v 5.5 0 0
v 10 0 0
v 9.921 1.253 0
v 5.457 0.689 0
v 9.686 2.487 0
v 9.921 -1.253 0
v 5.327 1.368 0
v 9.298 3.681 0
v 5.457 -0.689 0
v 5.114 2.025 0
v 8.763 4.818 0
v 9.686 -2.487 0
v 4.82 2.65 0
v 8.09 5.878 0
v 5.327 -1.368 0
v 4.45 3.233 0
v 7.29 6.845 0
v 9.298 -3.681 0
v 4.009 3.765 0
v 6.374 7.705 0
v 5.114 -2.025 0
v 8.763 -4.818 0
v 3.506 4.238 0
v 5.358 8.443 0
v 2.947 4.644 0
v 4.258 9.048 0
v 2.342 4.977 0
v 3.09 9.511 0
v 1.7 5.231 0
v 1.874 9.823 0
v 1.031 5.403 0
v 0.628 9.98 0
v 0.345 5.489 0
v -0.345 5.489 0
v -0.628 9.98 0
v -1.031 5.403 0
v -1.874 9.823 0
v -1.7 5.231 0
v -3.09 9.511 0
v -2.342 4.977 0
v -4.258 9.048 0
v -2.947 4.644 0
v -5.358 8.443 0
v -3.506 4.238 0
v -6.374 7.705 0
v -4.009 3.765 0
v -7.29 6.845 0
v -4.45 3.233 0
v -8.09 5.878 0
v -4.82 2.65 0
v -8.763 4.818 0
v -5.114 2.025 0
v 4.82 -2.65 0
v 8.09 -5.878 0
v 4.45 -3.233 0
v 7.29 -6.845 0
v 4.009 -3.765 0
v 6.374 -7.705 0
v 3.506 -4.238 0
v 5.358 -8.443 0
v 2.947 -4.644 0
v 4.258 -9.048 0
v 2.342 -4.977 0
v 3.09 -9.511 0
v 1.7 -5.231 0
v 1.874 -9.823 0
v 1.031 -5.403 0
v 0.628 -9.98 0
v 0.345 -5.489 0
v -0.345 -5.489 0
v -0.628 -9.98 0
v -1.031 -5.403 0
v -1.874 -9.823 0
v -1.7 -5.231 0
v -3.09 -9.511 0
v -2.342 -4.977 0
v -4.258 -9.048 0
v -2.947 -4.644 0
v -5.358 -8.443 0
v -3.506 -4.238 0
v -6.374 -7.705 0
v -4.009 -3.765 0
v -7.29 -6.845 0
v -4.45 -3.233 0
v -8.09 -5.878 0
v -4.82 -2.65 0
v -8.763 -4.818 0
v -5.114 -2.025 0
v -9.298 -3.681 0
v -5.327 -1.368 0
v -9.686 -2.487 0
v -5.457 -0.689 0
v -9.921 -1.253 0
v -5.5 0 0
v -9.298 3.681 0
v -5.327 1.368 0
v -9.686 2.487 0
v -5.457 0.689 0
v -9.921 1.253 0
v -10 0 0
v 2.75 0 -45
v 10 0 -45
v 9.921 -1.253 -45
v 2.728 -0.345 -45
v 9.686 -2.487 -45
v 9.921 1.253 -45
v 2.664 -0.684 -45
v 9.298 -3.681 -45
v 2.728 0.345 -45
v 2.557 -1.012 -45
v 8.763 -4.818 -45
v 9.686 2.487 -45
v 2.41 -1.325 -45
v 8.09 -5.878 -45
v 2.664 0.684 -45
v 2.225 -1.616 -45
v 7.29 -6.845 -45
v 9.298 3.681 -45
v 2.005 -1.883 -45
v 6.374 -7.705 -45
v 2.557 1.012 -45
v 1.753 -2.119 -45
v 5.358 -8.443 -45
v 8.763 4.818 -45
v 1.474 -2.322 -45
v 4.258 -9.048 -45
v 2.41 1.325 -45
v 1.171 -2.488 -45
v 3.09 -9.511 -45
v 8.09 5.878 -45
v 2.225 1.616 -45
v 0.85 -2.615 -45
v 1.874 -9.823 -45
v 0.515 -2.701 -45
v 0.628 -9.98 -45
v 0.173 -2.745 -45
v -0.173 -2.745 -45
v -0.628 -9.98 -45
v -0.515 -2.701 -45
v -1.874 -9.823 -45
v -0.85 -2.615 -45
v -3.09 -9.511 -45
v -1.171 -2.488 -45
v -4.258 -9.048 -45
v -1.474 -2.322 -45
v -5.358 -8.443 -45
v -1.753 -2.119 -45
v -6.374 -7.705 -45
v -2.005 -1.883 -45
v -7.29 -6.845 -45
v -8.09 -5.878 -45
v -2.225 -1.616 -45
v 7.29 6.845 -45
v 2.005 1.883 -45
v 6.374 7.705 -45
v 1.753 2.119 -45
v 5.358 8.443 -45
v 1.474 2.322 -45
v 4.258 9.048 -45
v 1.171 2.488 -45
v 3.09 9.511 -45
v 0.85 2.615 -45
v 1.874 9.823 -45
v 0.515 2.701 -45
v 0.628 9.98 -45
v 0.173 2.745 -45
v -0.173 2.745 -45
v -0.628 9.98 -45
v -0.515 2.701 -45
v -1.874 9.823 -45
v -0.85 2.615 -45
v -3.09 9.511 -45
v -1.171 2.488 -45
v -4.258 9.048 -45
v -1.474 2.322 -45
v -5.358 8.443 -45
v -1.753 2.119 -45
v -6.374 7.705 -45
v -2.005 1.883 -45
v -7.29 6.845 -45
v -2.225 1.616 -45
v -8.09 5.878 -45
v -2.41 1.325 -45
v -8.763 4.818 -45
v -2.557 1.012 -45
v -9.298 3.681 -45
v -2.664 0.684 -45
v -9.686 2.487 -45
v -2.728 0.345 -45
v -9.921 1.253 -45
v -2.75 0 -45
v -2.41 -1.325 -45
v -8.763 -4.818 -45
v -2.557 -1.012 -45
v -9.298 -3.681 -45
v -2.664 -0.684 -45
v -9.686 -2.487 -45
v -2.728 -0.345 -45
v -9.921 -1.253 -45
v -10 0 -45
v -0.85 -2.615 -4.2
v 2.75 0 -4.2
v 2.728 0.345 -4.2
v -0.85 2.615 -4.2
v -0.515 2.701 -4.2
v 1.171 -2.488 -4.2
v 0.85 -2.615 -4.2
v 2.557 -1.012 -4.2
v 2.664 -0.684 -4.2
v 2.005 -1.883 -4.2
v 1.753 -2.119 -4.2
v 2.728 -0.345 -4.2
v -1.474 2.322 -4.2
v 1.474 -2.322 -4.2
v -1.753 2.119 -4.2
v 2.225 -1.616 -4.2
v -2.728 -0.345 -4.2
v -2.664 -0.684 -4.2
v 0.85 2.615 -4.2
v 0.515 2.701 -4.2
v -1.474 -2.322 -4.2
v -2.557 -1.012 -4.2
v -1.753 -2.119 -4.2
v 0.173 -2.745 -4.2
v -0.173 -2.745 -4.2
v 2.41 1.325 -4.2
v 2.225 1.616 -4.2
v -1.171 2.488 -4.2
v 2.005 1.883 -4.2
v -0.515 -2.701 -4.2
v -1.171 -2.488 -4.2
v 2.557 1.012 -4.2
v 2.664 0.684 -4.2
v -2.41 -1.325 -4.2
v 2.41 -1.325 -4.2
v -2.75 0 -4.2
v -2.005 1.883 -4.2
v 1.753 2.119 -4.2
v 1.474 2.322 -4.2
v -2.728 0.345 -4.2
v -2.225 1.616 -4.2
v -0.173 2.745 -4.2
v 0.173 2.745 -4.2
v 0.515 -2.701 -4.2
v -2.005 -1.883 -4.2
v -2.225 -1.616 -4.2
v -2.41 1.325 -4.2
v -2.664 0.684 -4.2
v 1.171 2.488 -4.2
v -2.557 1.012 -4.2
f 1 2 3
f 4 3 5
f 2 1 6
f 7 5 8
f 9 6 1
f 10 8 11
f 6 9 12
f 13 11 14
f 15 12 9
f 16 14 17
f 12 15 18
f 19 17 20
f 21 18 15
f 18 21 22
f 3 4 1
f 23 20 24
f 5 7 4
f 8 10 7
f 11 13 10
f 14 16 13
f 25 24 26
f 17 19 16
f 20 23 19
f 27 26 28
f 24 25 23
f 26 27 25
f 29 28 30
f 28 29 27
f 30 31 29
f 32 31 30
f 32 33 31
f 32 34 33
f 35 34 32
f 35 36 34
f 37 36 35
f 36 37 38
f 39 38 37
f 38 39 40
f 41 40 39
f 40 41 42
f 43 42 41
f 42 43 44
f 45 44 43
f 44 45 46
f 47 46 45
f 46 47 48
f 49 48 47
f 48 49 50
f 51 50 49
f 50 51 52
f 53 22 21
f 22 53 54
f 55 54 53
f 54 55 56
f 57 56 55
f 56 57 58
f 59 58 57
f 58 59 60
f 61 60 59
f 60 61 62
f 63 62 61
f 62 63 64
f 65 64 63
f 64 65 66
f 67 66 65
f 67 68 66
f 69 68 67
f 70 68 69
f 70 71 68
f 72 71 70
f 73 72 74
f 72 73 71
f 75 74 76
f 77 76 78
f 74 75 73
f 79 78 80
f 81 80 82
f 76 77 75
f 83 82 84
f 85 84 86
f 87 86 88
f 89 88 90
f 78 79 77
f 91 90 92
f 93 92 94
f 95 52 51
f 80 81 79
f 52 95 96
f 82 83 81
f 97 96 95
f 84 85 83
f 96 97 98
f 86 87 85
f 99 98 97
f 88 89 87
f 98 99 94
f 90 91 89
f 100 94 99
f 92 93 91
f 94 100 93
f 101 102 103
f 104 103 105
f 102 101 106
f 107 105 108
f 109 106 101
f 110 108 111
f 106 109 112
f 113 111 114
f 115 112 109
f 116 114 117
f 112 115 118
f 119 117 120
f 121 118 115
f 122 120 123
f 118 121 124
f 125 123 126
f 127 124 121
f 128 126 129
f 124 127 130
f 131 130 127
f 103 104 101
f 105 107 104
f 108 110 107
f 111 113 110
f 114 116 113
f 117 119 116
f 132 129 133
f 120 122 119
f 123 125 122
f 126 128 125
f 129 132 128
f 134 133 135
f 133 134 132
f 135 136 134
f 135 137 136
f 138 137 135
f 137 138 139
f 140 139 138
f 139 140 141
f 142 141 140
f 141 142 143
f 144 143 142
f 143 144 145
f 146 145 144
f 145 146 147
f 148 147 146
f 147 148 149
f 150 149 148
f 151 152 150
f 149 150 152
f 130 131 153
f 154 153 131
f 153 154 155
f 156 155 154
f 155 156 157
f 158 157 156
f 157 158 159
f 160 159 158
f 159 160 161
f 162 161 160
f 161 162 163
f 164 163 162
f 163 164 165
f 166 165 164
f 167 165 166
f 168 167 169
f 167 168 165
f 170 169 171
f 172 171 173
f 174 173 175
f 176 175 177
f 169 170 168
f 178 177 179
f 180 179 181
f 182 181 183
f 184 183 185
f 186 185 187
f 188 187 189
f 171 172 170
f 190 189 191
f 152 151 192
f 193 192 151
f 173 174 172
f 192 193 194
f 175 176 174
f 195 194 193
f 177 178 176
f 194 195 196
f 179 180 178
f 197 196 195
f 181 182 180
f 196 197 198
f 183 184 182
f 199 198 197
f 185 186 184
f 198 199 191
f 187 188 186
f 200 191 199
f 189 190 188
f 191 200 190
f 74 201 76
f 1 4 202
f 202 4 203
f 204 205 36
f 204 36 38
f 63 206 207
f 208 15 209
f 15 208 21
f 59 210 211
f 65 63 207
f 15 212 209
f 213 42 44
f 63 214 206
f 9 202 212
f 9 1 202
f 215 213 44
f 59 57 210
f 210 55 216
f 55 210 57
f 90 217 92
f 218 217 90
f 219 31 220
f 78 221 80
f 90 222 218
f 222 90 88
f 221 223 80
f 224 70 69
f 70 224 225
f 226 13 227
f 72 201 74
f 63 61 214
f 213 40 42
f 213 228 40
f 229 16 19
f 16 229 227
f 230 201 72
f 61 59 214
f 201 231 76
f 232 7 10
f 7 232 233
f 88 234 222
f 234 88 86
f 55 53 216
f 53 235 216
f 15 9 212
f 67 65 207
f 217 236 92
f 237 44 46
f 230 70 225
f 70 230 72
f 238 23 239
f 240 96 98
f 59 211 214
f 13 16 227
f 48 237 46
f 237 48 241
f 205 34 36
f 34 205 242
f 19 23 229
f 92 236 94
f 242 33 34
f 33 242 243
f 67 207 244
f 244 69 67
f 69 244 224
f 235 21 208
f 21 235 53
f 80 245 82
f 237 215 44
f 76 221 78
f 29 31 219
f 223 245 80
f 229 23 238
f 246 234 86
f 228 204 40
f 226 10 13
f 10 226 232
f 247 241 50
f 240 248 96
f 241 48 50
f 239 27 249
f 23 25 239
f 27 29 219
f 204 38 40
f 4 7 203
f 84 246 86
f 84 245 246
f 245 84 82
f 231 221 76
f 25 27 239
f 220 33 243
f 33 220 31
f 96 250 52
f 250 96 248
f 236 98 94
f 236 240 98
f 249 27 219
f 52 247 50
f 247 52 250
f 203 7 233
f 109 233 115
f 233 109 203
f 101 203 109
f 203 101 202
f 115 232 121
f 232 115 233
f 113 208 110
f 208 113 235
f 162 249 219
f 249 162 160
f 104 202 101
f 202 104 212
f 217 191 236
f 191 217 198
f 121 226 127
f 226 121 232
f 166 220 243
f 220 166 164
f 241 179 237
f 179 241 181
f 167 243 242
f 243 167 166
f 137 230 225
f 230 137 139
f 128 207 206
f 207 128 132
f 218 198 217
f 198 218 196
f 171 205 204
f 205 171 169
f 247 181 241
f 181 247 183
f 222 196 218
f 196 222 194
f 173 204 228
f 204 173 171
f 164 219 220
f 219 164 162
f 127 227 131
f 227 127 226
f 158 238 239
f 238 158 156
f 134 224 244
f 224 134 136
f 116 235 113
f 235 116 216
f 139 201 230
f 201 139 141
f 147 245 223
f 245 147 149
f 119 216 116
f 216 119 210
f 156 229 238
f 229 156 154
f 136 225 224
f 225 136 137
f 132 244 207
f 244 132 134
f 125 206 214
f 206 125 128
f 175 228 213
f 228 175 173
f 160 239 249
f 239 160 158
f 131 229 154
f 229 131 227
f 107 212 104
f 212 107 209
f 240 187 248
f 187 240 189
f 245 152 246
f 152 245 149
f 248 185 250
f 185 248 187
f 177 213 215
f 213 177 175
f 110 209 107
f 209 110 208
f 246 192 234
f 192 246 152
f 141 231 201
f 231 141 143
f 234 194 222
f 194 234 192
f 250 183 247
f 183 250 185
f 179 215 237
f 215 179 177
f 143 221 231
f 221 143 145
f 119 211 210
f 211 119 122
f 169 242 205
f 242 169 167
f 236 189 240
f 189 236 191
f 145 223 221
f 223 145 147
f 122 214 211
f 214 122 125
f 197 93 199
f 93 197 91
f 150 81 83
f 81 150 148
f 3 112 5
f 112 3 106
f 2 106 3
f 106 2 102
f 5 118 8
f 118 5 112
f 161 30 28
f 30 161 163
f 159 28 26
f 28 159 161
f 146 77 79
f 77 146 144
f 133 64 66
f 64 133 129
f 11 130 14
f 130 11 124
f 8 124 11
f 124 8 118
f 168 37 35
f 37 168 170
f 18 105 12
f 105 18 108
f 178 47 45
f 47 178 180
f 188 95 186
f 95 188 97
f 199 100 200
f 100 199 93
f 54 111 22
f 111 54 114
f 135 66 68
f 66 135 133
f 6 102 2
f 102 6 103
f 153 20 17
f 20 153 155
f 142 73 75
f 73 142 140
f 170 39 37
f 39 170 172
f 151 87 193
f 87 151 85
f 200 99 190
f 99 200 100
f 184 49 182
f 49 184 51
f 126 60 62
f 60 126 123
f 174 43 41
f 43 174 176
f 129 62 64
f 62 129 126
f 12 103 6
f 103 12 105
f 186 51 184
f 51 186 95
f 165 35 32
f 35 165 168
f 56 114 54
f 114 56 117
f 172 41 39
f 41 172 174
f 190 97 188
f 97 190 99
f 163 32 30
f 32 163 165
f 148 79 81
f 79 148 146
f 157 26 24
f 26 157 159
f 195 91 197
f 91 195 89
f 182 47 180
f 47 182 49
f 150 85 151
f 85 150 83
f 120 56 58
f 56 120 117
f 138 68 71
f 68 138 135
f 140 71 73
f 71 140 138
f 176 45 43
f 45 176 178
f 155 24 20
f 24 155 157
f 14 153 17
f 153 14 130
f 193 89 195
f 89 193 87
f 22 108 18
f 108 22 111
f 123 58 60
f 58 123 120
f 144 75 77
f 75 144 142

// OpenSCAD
$fn = 50;


difference() {
	union() {
		translate(v = [0, 0, -45.0000000000]) {
			cylinder(h = 45, r = 10.0000000000);
		}
	}
	union() {
		translate(v = [0, 0, 0]) {
			rotate(a = [0, 0, 0]) {
				difference() {
					union() {
						#translate(v = [0, 0, -45.0000000000]) {
							cylinder(h = 45, r = 2.2500000000);
						}
						#translate(v = [0, 0, -4.2000000000]) {
							cylinder(h = 4.2000000000, r1 = 2.7500000000, r2 = 5.5000000000);
						}
						#translate(v = [0, 0, -45.0000000000]) {
							cylinder(h = 45, r = 2.7500000000);
						}
						#translate(v = [0, 0, -45.0000000000]) {
							cylinder(h = 45, r = 2.2500000000);
						}
					}
					union();
				}
			}
		}
	}
}
